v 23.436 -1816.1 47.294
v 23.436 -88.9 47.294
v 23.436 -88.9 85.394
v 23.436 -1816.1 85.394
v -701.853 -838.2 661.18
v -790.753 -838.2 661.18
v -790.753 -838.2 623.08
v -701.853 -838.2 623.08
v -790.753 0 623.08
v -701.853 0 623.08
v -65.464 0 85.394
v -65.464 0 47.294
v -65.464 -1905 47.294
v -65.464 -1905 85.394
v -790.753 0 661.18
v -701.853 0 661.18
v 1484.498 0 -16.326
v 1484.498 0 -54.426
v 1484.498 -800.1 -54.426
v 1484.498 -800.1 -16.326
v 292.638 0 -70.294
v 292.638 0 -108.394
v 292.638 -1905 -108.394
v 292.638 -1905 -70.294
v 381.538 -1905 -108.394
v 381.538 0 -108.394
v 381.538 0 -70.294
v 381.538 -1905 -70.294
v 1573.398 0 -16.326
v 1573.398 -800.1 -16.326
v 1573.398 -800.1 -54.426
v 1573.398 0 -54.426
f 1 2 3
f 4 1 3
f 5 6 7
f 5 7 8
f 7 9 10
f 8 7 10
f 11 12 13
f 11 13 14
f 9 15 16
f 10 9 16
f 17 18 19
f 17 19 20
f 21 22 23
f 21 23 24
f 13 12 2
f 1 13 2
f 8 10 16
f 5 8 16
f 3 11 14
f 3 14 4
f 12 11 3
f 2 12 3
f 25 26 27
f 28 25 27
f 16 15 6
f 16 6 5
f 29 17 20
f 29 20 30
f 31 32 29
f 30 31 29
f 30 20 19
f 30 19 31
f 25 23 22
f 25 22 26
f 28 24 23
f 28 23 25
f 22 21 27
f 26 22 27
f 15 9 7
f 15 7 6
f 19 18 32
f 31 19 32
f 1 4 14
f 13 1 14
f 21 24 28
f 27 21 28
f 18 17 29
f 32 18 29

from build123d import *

# Parameters (mm, degrees)
F0_W     = 88.9
F0_H     = 38.1
F1_DEPTH = 1905
F3_DEPTH = 38.1
F4_W     = 88.9
F4_H     = 38.1
F5_DEPTH = 1905
F6_W     = 88.9
F6_H     = 38.1
F7_DEPTH = 800.1
F8_W     = 88.9
F8_H     = 38.1
F9_DEPTH = 838.2


with BuildPart() as f1:
    # F0 (on Front) → F1 (new body)
    with BuildSketch(Plane.XZ):
        with Locations((-21.014355, 66.343872)):
            Rectangle(F0_W, F0_H)
    extrude(amount=F1_DEPTH)

    # F2 (on face) → F3 (cut, through all)
    with BuildSketch(Plane.XY.offset(85.393872)):
        Polygon((23.435645, -1816.1), (-65.464355, -1905), (23.435645, -1905), align=None)
        Polygon((-65.464355, 0), (23.435645, -88.9), (23.435645, 0), align=None)
    extrude(amount=-F3_DEPTH, mode=Mode.SUBTRACT)


with BuildPart() as f5:
    # F4 (on Front) → F5 (new body)
    with BuildSketch(Plane.XZ):
        with Locations((337.08784, -89.343989)):
            Rectangle(F4_W, F4_H)
    extrude(amount=F5_DEPTH)


with BuildPart() as f7:
    # F6 (on Front) → F7 (new body)
    with BuildSketch(Plane.XZ):
        with Locations((1528.948247, -35.375655)):
            Rectangle(F6_W, F6_H)
    extrude(amount=F7_DEPTH)


with BuildPart() as f9:
    # F8 (on Front) → F9 (new body)
    with BuildSketch(Plane.XZ):
        with Locations((-746.302992, 642.129938)):
            Rectangle(F8_W, F8_H)
    extrude(amount=F9_DEPTH)


solid = Compound([f1.part, f5.part, f7.part, f9.part])
